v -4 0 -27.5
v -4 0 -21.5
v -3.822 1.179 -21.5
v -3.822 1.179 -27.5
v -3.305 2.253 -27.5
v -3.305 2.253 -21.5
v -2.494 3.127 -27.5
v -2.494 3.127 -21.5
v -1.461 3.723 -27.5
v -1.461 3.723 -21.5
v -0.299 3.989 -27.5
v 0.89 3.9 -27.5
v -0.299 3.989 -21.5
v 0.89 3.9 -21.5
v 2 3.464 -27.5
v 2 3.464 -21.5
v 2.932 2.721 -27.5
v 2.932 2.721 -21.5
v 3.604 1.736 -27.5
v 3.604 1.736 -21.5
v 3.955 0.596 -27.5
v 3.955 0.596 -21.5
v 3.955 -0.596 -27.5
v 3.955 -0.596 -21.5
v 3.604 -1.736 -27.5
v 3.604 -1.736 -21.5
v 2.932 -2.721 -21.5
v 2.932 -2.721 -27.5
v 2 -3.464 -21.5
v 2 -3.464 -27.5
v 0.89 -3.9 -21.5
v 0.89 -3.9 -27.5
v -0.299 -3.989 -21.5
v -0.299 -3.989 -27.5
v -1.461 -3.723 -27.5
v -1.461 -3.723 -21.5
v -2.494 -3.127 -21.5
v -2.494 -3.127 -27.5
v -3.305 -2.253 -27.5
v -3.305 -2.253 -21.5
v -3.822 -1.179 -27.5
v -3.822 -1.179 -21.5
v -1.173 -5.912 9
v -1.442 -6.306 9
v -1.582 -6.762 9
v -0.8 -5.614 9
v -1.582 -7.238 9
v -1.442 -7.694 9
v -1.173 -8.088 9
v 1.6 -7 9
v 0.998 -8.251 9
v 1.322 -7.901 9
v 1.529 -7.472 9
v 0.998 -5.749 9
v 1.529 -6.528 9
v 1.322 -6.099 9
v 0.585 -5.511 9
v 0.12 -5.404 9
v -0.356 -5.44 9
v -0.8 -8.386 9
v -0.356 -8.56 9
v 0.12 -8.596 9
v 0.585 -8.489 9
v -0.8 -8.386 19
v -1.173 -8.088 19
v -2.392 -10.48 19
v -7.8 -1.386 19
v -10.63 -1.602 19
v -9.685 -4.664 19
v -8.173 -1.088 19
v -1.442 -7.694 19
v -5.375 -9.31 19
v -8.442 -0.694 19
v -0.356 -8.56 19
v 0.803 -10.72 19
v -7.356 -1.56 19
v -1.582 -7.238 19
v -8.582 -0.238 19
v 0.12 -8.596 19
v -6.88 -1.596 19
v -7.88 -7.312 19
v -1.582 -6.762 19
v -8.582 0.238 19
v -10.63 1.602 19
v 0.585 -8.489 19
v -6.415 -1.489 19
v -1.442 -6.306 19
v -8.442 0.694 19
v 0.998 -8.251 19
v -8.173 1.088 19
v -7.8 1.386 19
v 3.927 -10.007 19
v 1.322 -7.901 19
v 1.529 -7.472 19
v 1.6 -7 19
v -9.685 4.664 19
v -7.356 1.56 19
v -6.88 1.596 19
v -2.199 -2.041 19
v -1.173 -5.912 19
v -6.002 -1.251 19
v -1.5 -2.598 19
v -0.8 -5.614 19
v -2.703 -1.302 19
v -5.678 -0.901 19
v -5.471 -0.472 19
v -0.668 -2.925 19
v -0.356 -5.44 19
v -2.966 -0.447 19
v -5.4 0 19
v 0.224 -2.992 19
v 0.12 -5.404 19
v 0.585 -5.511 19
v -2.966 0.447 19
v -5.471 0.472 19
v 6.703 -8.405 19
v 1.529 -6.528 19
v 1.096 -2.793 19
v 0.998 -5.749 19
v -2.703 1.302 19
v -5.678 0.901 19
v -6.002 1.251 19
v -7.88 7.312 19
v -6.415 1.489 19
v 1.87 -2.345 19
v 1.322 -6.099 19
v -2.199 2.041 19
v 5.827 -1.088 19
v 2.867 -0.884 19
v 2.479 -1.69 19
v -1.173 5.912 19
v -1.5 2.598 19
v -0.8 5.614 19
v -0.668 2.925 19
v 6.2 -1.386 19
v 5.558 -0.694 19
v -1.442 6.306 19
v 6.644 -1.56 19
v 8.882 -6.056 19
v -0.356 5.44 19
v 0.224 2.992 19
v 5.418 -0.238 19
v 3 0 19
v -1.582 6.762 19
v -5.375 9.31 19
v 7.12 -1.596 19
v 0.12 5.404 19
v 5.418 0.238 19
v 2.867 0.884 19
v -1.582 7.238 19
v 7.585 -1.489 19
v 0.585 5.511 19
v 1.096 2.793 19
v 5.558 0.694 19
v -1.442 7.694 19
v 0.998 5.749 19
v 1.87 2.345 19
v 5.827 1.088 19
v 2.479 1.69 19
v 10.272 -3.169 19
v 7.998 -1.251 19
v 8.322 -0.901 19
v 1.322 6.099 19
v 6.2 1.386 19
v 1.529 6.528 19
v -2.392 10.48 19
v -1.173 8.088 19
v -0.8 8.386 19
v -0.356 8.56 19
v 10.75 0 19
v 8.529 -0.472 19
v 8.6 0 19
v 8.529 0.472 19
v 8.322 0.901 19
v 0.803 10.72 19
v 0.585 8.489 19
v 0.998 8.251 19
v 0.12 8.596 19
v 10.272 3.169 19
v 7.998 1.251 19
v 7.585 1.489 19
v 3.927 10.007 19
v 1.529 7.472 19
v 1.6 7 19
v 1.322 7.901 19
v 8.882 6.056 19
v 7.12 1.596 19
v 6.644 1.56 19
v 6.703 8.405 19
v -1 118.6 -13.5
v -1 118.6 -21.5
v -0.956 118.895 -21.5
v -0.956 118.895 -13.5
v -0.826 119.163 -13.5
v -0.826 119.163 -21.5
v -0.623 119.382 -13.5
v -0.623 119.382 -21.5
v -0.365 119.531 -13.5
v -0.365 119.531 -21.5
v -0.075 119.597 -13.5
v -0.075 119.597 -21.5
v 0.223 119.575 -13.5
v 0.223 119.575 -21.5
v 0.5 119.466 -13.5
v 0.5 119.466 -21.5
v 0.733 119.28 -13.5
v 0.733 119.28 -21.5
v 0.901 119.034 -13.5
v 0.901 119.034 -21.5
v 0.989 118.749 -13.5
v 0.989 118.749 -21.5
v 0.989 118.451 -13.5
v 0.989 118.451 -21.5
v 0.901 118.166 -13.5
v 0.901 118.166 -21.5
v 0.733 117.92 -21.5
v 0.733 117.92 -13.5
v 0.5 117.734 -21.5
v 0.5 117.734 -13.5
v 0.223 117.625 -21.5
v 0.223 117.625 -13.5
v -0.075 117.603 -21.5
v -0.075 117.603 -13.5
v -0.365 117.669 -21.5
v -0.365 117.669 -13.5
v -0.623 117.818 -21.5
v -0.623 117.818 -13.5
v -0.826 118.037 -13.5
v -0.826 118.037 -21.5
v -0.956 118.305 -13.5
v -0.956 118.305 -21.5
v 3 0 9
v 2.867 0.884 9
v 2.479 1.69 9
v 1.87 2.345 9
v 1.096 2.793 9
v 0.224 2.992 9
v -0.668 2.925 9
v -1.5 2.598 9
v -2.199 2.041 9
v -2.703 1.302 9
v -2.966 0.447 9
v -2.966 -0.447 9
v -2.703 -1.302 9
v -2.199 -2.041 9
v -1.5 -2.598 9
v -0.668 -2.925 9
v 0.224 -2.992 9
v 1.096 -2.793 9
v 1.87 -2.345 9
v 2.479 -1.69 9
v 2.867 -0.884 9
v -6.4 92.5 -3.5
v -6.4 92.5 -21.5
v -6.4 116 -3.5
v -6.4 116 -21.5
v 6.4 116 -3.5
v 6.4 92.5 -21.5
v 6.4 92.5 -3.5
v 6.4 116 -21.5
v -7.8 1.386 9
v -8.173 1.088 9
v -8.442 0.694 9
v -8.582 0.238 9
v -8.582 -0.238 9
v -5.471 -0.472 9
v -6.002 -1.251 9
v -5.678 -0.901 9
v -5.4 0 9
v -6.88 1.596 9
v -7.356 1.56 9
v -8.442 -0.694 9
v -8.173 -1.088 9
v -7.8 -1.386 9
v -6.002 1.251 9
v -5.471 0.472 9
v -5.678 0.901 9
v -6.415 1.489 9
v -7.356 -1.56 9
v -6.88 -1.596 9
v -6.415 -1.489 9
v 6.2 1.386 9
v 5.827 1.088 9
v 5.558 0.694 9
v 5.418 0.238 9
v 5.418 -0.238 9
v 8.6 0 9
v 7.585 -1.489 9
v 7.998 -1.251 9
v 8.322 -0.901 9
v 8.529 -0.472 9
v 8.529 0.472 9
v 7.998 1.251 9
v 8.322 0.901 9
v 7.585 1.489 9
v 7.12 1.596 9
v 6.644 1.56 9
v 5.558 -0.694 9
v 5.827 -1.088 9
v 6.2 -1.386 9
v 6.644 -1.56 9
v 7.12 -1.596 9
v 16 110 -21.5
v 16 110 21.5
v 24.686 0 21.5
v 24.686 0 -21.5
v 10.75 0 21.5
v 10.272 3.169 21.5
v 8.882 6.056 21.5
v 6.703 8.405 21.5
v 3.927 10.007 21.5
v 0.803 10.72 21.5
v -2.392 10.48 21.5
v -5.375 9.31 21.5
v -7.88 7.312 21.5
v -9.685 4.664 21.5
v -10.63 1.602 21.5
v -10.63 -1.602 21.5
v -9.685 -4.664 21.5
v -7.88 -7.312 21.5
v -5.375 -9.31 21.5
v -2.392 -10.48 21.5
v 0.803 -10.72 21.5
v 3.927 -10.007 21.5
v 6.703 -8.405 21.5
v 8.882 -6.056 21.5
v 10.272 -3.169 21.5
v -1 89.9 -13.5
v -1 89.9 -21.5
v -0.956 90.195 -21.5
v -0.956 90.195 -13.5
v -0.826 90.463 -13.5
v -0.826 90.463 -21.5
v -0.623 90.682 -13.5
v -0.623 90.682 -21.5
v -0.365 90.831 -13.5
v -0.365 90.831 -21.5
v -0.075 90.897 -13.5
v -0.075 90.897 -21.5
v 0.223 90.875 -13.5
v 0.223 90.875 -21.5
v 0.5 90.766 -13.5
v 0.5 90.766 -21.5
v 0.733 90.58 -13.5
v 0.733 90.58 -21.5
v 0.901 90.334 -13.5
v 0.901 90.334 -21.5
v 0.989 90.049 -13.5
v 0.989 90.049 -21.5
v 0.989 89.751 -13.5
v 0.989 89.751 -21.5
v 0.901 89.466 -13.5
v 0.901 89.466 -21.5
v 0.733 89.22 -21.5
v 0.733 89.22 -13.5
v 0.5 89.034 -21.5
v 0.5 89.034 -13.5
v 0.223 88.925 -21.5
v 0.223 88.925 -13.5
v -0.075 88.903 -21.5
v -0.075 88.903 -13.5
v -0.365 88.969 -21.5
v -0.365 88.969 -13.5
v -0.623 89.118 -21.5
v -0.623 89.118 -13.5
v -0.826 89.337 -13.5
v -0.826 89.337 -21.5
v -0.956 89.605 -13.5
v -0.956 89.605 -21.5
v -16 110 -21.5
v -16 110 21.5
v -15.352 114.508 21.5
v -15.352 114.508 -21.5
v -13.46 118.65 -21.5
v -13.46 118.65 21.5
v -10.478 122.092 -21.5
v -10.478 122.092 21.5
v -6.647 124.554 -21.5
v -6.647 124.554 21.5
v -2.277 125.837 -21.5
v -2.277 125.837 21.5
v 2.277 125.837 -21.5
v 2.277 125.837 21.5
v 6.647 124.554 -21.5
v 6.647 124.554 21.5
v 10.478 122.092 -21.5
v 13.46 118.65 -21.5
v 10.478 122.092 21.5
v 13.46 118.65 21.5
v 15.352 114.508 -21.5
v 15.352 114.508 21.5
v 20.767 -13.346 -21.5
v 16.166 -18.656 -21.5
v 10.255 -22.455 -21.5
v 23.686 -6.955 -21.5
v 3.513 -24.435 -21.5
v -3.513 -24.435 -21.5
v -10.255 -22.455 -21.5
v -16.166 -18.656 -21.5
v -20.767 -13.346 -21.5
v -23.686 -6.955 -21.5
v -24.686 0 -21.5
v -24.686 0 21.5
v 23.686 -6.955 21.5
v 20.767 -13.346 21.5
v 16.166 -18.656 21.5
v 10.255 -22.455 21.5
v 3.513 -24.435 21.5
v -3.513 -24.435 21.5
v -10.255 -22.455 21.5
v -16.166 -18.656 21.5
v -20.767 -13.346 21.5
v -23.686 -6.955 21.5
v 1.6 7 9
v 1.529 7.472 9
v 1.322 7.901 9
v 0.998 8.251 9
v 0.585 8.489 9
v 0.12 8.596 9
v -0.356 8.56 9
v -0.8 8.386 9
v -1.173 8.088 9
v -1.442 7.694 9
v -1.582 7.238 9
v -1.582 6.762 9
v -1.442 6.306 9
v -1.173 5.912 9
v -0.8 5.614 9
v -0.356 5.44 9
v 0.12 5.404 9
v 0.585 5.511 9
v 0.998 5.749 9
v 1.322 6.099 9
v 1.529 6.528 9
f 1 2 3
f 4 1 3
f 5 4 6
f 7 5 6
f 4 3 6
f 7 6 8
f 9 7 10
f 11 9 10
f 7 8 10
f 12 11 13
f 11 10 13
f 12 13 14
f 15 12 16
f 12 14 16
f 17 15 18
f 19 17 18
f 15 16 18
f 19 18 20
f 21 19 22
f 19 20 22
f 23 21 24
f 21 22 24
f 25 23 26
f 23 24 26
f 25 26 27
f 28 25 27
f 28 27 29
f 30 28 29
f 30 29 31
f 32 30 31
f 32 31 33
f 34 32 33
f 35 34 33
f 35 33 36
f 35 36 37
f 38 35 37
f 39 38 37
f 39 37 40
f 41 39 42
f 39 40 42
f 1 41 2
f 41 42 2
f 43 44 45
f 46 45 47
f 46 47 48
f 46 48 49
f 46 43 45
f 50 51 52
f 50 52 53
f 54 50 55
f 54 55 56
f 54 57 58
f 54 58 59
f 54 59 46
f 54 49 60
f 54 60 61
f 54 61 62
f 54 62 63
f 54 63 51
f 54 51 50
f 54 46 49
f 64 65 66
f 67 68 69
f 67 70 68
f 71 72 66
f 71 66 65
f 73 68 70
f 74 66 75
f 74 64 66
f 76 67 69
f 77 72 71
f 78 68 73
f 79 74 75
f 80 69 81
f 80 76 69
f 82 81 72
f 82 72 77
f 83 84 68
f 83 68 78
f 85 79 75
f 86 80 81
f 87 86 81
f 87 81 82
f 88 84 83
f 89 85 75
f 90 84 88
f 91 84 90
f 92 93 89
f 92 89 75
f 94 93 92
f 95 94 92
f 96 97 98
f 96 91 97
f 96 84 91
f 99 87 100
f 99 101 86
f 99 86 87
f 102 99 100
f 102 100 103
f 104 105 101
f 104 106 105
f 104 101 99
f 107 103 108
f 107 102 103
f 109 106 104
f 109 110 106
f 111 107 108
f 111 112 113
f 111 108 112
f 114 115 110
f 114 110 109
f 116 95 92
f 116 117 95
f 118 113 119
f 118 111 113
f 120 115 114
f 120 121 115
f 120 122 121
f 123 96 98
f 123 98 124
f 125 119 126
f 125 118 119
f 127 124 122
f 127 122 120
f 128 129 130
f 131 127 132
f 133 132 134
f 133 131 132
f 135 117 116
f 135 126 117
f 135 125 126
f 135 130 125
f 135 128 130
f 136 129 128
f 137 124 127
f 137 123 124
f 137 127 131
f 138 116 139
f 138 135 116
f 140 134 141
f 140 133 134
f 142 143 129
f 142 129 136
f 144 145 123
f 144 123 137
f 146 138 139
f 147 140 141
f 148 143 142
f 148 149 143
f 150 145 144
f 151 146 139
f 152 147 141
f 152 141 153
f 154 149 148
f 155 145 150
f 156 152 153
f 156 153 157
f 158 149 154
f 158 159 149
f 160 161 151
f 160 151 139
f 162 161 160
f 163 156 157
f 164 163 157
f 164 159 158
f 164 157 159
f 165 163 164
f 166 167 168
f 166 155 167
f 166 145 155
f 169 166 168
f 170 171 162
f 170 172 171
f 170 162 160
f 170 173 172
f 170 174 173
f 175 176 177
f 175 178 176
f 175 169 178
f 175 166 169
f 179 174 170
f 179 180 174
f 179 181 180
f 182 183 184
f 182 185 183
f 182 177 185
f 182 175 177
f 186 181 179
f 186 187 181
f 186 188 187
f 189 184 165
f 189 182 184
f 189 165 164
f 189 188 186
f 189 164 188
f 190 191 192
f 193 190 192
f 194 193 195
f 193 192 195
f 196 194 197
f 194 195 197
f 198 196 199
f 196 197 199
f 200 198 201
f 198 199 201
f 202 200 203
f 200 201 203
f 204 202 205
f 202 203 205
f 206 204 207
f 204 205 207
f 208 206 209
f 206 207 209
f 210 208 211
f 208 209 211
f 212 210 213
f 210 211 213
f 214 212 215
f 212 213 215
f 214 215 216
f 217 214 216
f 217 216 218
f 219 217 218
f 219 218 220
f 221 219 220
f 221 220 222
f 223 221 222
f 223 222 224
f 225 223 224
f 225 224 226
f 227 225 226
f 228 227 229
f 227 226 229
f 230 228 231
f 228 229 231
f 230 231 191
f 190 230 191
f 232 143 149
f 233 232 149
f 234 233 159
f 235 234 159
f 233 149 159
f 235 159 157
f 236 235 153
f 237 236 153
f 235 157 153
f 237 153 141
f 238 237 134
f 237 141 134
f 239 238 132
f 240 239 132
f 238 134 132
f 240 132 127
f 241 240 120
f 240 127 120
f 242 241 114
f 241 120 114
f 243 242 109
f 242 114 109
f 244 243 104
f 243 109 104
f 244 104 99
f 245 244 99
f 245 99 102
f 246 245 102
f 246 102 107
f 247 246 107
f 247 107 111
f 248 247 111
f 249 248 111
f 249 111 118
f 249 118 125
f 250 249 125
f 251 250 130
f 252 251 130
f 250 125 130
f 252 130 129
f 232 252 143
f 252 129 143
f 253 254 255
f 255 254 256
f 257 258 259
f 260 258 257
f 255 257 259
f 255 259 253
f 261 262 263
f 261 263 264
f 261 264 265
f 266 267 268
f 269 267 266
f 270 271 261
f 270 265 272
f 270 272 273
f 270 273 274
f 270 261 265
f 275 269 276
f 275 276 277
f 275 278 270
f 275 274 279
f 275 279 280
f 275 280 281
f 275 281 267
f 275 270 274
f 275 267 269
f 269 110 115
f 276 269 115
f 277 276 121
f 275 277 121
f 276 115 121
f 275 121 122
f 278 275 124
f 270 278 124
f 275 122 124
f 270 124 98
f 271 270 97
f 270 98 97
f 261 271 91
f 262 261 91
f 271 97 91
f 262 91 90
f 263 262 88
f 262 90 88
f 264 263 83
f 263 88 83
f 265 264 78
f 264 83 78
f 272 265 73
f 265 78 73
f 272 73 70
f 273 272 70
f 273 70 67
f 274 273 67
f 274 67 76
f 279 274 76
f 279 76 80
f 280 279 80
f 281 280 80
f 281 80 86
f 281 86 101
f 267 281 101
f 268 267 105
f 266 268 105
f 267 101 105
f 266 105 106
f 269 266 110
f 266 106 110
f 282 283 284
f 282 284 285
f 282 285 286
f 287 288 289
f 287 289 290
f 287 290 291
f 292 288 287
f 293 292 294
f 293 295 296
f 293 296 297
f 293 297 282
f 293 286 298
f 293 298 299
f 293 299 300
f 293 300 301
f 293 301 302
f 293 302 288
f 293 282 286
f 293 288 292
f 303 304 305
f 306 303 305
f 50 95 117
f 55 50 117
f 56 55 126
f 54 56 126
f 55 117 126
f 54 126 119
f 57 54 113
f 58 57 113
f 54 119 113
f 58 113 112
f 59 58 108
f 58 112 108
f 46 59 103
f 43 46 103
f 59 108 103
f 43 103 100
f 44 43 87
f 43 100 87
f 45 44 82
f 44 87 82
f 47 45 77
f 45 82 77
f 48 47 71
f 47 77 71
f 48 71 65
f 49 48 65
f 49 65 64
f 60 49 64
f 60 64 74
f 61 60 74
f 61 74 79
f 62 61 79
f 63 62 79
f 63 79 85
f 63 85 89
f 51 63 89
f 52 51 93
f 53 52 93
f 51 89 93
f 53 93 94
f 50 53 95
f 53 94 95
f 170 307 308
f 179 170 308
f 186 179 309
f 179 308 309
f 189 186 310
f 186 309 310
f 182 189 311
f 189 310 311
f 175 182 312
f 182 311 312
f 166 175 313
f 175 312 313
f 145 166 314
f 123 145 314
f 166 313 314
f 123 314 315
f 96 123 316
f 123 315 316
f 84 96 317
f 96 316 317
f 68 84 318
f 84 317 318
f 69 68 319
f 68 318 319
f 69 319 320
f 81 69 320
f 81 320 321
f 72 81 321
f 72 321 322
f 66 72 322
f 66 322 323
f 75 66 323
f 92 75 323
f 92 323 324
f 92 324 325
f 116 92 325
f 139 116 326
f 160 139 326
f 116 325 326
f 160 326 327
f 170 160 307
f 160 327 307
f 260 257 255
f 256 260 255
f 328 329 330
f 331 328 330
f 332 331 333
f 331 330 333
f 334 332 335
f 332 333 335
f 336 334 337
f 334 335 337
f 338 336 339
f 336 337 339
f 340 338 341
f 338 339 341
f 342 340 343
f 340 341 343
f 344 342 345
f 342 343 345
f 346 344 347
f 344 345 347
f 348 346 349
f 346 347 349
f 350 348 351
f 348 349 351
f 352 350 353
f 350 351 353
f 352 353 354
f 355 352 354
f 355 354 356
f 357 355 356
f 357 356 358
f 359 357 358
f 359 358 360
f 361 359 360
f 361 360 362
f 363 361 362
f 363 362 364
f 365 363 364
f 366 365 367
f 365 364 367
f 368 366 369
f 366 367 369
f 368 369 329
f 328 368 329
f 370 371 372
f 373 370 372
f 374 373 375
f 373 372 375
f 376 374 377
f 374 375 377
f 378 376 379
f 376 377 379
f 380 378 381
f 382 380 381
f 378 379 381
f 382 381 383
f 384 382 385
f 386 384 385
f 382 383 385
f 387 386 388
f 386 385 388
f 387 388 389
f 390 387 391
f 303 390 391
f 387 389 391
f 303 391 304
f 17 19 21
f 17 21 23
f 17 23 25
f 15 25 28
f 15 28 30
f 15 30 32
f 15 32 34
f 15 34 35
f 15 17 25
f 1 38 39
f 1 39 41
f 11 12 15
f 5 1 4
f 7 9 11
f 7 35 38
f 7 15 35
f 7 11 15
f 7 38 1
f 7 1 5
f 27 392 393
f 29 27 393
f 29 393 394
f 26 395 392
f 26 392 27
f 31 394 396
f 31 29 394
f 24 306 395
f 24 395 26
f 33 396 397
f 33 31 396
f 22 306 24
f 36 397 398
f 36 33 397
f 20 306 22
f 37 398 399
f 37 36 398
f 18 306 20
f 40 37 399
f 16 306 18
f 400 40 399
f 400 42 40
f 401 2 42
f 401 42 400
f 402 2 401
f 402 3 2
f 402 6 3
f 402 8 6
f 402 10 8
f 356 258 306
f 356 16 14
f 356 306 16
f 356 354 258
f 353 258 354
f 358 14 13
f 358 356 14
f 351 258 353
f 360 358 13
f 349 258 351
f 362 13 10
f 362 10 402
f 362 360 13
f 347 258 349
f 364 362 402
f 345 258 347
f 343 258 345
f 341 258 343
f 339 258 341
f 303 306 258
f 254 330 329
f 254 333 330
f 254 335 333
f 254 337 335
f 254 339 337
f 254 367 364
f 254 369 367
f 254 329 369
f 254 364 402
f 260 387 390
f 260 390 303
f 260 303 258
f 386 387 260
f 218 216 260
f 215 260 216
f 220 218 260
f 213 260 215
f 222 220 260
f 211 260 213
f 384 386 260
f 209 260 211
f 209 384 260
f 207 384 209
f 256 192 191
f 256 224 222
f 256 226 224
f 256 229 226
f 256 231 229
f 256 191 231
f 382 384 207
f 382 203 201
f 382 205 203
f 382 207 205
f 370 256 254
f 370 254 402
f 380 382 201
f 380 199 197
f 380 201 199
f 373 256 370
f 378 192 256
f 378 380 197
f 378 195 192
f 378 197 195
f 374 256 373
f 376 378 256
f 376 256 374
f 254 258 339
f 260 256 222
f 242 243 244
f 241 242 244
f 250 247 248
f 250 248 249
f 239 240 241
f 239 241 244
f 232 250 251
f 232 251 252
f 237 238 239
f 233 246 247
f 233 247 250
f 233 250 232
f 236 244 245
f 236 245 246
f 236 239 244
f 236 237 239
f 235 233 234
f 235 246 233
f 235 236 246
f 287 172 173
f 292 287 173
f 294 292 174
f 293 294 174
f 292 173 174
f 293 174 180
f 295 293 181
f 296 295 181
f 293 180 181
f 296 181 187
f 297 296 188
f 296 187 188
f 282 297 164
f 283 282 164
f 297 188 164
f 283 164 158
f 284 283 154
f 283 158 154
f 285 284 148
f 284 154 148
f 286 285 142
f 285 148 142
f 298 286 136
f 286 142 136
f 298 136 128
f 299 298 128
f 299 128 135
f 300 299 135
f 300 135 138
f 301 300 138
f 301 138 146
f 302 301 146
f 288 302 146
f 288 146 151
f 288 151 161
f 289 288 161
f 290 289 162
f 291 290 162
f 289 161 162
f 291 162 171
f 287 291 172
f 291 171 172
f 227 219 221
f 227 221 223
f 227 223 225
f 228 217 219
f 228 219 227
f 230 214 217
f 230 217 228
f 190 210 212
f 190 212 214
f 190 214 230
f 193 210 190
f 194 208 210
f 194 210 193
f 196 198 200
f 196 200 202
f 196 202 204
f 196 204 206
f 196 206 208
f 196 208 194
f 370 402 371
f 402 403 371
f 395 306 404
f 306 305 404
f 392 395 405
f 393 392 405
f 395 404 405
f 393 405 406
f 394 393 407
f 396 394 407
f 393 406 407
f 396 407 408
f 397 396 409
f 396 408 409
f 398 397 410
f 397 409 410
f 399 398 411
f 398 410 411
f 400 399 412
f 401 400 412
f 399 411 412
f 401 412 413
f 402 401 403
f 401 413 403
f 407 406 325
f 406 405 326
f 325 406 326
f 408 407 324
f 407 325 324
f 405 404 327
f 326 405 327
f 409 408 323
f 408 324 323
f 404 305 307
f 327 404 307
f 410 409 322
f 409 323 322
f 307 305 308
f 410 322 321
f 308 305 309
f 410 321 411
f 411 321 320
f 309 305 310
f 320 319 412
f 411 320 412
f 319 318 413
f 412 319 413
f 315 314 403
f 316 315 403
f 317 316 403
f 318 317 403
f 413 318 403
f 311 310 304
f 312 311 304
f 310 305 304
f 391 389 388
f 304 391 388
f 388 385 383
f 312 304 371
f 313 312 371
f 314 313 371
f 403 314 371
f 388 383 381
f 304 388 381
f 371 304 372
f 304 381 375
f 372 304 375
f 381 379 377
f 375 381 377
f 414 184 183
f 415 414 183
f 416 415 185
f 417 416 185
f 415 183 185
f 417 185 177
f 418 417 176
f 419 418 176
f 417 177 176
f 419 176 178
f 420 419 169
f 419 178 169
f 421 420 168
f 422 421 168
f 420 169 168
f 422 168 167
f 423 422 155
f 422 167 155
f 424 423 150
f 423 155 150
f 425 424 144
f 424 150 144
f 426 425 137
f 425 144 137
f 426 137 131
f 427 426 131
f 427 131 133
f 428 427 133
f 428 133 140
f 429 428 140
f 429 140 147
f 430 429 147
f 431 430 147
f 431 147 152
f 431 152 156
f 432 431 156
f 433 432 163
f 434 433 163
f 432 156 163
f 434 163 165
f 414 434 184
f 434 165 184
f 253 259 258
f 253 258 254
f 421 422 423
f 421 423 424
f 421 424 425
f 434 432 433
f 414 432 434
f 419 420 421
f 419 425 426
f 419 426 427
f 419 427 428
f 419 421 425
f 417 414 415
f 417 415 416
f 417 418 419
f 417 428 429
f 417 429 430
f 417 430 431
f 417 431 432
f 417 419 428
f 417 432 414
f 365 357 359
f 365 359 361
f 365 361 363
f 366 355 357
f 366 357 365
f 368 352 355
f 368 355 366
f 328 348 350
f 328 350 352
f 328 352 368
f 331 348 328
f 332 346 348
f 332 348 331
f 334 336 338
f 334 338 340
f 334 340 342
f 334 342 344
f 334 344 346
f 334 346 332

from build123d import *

# Parameters (mm, degrees)
BOSS_EXTRUDE1_DEPTH = 21.5
SKETCH2_R           = 10.75
CUT_EXTRUDE1_DEPTH  = 2.5
SKETCH3_R           = 3
SKETCH3_R_2         = 1.6
CUT_EXTRUDE2_DEPTH  = 10
SKETCH4_R           = 4
BOSS_EXTRUDE2_DEPTH = 6
SKETCH6_W           = 12.8
SKETCH6_H           = 23.5
CUT_EXTRUDE3_DEPTH  = 18
SKETCH8_R           = 1
CUT_EXTRUDE4_DEPTH  = 8


with BuildPart() as part:
    # Sketch1 → Boss-Extrude1 (new, symmetric)
    with BuildSketch(Plane.XY):
        with BuildLine():
            Line((16, 110), (24.685901916, 0))
            ThreePointArc((24.685901916, 0), (0, -24.685901916), (-24.685901916, 0))
            Line((-24.685901916, 0), (-16, 110))
            ThreePointArc((-16, 110), (0, 126), (16, 110))
        make_face()
    extrude(amount=BOSS_EXTRUDE1_DEPTH, both=True)

    # Sketch2 → Cut-Extrude1 (cut)
    with BuildSketch(Plane.XY.offset(21.5)):
        Circle(SKETCH2_R)
    extrude(amount=-CUT_EXTRUDE1_DEPTH, mode=Mode.SUBTRACT)

    # Sketch3 → Cut-Extrude2 (cut)
    with BuildSketch(Plane.XY.offset(19)):
        Circle(SKETCH3_R)
        with Locations((0, 7)):
            Circle(SKETCH3_R_2)
        with Locations((7, 0)):
            Circle(SKETCH3_R_2)
        with Locations((0, -7)):
            Circle(SKETCH3_R_2)
        with Locations((-7, 0)):
            Circle(SKETCH3_R_2)
    extrude(amount=-CUT_EXTRUDE2_DEPTH, mode=Mode.SUBTRACT)

    # Sketch4 → Boss-Extrude2 (add)
    with BuildSketch(Plane(origin=(0, 0, -21.5), x_dir=(-1, 0, 0), z_dir=(0, 0, -1))):
        Circle(SKETCH4_R)
    extrude(amount=BOSS_EXTRUDE2_DEPTH)

    # Sketch6 → Cut-Extrude3 (cut)
    with BuildSketch(Plane(origin=(0, 0, -21.5), x_dir=(-1, 0, 0), z_dir=(0, 0, -1))):
        with Locations((0, 104.25)):
            Rectangle(SKETCH6_W, SKETCH6_H)
    extrude(amount=-CUT_EXTRUDE3_DEPTH, mode=Mode.SUBTRACT)

    # Sketch8 → Cut-Extrude4 (cut)
    with BuildSketch(Plane(origin=(0, 0, -21.5), x_dir=(-1, 0, 0), z_dir=(0, 0, -1))):
        with Locations((0, 118.6)):
            Circle(SKETCH8_R)
        with Locations((0, 89.9)):
            Circle(SKETCH8_R)
    extrude(amount=-CUT_EXTRUDE4_DEPTH, mode=Mode.SUBTRACT)


solid = part.part
